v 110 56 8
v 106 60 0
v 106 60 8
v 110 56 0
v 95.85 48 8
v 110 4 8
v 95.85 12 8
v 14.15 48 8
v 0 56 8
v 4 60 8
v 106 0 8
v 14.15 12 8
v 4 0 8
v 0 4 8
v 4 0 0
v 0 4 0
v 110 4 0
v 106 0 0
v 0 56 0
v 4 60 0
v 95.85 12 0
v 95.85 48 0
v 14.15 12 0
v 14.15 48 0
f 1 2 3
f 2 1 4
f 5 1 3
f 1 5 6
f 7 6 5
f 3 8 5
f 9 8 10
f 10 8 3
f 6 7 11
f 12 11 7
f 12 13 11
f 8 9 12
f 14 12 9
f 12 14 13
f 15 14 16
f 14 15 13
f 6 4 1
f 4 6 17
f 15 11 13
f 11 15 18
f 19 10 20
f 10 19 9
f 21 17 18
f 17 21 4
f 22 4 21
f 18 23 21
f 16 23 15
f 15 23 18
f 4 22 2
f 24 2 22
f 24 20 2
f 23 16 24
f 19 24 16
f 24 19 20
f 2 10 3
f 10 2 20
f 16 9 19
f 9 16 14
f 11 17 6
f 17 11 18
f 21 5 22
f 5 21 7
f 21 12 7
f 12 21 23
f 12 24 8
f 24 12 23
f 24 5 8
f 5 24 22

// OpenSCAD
$fn = 32;

// ----------------------------------------------------------------------
// Windowed plate: 1 voids, 110 x 60 x 8 mm
// ----------------------------------------------------------------------

// --- parameters (mm) ---
plate_l = 110;            // plate length, X
plate_w = 60;             // plate width, Y
plate_t = 8;              // plate thickness, Z
edge_margin = 8;          // wall from the plate edge to any window
win1_l = 81.7;            // window length
win1_w = 36;              // window width
depth_1 = 8;              // depth of void 1 (full thickness = through)
corner_c = 4;             // corner chamfer of the plate

profile = [[4, 0], [106, 0], [110, 4], [110, 56], [106, 60], [4, 60], [0, 56], [0, 4]];  // primary outline, 8 points, counter clockwise
void_1 = [[14.15, 12], [95.85, 12], [95.85, 48], [14.15, 48]];  // large central window, 4 points

// --- the one profile operation ---
difference() {
  linear_extrude(height = plate_t) polygon(points = profile);
  translate([0, 0, -1])
    linear_extrude(height = plate_t + 2) polygon(points = void_1);
}
